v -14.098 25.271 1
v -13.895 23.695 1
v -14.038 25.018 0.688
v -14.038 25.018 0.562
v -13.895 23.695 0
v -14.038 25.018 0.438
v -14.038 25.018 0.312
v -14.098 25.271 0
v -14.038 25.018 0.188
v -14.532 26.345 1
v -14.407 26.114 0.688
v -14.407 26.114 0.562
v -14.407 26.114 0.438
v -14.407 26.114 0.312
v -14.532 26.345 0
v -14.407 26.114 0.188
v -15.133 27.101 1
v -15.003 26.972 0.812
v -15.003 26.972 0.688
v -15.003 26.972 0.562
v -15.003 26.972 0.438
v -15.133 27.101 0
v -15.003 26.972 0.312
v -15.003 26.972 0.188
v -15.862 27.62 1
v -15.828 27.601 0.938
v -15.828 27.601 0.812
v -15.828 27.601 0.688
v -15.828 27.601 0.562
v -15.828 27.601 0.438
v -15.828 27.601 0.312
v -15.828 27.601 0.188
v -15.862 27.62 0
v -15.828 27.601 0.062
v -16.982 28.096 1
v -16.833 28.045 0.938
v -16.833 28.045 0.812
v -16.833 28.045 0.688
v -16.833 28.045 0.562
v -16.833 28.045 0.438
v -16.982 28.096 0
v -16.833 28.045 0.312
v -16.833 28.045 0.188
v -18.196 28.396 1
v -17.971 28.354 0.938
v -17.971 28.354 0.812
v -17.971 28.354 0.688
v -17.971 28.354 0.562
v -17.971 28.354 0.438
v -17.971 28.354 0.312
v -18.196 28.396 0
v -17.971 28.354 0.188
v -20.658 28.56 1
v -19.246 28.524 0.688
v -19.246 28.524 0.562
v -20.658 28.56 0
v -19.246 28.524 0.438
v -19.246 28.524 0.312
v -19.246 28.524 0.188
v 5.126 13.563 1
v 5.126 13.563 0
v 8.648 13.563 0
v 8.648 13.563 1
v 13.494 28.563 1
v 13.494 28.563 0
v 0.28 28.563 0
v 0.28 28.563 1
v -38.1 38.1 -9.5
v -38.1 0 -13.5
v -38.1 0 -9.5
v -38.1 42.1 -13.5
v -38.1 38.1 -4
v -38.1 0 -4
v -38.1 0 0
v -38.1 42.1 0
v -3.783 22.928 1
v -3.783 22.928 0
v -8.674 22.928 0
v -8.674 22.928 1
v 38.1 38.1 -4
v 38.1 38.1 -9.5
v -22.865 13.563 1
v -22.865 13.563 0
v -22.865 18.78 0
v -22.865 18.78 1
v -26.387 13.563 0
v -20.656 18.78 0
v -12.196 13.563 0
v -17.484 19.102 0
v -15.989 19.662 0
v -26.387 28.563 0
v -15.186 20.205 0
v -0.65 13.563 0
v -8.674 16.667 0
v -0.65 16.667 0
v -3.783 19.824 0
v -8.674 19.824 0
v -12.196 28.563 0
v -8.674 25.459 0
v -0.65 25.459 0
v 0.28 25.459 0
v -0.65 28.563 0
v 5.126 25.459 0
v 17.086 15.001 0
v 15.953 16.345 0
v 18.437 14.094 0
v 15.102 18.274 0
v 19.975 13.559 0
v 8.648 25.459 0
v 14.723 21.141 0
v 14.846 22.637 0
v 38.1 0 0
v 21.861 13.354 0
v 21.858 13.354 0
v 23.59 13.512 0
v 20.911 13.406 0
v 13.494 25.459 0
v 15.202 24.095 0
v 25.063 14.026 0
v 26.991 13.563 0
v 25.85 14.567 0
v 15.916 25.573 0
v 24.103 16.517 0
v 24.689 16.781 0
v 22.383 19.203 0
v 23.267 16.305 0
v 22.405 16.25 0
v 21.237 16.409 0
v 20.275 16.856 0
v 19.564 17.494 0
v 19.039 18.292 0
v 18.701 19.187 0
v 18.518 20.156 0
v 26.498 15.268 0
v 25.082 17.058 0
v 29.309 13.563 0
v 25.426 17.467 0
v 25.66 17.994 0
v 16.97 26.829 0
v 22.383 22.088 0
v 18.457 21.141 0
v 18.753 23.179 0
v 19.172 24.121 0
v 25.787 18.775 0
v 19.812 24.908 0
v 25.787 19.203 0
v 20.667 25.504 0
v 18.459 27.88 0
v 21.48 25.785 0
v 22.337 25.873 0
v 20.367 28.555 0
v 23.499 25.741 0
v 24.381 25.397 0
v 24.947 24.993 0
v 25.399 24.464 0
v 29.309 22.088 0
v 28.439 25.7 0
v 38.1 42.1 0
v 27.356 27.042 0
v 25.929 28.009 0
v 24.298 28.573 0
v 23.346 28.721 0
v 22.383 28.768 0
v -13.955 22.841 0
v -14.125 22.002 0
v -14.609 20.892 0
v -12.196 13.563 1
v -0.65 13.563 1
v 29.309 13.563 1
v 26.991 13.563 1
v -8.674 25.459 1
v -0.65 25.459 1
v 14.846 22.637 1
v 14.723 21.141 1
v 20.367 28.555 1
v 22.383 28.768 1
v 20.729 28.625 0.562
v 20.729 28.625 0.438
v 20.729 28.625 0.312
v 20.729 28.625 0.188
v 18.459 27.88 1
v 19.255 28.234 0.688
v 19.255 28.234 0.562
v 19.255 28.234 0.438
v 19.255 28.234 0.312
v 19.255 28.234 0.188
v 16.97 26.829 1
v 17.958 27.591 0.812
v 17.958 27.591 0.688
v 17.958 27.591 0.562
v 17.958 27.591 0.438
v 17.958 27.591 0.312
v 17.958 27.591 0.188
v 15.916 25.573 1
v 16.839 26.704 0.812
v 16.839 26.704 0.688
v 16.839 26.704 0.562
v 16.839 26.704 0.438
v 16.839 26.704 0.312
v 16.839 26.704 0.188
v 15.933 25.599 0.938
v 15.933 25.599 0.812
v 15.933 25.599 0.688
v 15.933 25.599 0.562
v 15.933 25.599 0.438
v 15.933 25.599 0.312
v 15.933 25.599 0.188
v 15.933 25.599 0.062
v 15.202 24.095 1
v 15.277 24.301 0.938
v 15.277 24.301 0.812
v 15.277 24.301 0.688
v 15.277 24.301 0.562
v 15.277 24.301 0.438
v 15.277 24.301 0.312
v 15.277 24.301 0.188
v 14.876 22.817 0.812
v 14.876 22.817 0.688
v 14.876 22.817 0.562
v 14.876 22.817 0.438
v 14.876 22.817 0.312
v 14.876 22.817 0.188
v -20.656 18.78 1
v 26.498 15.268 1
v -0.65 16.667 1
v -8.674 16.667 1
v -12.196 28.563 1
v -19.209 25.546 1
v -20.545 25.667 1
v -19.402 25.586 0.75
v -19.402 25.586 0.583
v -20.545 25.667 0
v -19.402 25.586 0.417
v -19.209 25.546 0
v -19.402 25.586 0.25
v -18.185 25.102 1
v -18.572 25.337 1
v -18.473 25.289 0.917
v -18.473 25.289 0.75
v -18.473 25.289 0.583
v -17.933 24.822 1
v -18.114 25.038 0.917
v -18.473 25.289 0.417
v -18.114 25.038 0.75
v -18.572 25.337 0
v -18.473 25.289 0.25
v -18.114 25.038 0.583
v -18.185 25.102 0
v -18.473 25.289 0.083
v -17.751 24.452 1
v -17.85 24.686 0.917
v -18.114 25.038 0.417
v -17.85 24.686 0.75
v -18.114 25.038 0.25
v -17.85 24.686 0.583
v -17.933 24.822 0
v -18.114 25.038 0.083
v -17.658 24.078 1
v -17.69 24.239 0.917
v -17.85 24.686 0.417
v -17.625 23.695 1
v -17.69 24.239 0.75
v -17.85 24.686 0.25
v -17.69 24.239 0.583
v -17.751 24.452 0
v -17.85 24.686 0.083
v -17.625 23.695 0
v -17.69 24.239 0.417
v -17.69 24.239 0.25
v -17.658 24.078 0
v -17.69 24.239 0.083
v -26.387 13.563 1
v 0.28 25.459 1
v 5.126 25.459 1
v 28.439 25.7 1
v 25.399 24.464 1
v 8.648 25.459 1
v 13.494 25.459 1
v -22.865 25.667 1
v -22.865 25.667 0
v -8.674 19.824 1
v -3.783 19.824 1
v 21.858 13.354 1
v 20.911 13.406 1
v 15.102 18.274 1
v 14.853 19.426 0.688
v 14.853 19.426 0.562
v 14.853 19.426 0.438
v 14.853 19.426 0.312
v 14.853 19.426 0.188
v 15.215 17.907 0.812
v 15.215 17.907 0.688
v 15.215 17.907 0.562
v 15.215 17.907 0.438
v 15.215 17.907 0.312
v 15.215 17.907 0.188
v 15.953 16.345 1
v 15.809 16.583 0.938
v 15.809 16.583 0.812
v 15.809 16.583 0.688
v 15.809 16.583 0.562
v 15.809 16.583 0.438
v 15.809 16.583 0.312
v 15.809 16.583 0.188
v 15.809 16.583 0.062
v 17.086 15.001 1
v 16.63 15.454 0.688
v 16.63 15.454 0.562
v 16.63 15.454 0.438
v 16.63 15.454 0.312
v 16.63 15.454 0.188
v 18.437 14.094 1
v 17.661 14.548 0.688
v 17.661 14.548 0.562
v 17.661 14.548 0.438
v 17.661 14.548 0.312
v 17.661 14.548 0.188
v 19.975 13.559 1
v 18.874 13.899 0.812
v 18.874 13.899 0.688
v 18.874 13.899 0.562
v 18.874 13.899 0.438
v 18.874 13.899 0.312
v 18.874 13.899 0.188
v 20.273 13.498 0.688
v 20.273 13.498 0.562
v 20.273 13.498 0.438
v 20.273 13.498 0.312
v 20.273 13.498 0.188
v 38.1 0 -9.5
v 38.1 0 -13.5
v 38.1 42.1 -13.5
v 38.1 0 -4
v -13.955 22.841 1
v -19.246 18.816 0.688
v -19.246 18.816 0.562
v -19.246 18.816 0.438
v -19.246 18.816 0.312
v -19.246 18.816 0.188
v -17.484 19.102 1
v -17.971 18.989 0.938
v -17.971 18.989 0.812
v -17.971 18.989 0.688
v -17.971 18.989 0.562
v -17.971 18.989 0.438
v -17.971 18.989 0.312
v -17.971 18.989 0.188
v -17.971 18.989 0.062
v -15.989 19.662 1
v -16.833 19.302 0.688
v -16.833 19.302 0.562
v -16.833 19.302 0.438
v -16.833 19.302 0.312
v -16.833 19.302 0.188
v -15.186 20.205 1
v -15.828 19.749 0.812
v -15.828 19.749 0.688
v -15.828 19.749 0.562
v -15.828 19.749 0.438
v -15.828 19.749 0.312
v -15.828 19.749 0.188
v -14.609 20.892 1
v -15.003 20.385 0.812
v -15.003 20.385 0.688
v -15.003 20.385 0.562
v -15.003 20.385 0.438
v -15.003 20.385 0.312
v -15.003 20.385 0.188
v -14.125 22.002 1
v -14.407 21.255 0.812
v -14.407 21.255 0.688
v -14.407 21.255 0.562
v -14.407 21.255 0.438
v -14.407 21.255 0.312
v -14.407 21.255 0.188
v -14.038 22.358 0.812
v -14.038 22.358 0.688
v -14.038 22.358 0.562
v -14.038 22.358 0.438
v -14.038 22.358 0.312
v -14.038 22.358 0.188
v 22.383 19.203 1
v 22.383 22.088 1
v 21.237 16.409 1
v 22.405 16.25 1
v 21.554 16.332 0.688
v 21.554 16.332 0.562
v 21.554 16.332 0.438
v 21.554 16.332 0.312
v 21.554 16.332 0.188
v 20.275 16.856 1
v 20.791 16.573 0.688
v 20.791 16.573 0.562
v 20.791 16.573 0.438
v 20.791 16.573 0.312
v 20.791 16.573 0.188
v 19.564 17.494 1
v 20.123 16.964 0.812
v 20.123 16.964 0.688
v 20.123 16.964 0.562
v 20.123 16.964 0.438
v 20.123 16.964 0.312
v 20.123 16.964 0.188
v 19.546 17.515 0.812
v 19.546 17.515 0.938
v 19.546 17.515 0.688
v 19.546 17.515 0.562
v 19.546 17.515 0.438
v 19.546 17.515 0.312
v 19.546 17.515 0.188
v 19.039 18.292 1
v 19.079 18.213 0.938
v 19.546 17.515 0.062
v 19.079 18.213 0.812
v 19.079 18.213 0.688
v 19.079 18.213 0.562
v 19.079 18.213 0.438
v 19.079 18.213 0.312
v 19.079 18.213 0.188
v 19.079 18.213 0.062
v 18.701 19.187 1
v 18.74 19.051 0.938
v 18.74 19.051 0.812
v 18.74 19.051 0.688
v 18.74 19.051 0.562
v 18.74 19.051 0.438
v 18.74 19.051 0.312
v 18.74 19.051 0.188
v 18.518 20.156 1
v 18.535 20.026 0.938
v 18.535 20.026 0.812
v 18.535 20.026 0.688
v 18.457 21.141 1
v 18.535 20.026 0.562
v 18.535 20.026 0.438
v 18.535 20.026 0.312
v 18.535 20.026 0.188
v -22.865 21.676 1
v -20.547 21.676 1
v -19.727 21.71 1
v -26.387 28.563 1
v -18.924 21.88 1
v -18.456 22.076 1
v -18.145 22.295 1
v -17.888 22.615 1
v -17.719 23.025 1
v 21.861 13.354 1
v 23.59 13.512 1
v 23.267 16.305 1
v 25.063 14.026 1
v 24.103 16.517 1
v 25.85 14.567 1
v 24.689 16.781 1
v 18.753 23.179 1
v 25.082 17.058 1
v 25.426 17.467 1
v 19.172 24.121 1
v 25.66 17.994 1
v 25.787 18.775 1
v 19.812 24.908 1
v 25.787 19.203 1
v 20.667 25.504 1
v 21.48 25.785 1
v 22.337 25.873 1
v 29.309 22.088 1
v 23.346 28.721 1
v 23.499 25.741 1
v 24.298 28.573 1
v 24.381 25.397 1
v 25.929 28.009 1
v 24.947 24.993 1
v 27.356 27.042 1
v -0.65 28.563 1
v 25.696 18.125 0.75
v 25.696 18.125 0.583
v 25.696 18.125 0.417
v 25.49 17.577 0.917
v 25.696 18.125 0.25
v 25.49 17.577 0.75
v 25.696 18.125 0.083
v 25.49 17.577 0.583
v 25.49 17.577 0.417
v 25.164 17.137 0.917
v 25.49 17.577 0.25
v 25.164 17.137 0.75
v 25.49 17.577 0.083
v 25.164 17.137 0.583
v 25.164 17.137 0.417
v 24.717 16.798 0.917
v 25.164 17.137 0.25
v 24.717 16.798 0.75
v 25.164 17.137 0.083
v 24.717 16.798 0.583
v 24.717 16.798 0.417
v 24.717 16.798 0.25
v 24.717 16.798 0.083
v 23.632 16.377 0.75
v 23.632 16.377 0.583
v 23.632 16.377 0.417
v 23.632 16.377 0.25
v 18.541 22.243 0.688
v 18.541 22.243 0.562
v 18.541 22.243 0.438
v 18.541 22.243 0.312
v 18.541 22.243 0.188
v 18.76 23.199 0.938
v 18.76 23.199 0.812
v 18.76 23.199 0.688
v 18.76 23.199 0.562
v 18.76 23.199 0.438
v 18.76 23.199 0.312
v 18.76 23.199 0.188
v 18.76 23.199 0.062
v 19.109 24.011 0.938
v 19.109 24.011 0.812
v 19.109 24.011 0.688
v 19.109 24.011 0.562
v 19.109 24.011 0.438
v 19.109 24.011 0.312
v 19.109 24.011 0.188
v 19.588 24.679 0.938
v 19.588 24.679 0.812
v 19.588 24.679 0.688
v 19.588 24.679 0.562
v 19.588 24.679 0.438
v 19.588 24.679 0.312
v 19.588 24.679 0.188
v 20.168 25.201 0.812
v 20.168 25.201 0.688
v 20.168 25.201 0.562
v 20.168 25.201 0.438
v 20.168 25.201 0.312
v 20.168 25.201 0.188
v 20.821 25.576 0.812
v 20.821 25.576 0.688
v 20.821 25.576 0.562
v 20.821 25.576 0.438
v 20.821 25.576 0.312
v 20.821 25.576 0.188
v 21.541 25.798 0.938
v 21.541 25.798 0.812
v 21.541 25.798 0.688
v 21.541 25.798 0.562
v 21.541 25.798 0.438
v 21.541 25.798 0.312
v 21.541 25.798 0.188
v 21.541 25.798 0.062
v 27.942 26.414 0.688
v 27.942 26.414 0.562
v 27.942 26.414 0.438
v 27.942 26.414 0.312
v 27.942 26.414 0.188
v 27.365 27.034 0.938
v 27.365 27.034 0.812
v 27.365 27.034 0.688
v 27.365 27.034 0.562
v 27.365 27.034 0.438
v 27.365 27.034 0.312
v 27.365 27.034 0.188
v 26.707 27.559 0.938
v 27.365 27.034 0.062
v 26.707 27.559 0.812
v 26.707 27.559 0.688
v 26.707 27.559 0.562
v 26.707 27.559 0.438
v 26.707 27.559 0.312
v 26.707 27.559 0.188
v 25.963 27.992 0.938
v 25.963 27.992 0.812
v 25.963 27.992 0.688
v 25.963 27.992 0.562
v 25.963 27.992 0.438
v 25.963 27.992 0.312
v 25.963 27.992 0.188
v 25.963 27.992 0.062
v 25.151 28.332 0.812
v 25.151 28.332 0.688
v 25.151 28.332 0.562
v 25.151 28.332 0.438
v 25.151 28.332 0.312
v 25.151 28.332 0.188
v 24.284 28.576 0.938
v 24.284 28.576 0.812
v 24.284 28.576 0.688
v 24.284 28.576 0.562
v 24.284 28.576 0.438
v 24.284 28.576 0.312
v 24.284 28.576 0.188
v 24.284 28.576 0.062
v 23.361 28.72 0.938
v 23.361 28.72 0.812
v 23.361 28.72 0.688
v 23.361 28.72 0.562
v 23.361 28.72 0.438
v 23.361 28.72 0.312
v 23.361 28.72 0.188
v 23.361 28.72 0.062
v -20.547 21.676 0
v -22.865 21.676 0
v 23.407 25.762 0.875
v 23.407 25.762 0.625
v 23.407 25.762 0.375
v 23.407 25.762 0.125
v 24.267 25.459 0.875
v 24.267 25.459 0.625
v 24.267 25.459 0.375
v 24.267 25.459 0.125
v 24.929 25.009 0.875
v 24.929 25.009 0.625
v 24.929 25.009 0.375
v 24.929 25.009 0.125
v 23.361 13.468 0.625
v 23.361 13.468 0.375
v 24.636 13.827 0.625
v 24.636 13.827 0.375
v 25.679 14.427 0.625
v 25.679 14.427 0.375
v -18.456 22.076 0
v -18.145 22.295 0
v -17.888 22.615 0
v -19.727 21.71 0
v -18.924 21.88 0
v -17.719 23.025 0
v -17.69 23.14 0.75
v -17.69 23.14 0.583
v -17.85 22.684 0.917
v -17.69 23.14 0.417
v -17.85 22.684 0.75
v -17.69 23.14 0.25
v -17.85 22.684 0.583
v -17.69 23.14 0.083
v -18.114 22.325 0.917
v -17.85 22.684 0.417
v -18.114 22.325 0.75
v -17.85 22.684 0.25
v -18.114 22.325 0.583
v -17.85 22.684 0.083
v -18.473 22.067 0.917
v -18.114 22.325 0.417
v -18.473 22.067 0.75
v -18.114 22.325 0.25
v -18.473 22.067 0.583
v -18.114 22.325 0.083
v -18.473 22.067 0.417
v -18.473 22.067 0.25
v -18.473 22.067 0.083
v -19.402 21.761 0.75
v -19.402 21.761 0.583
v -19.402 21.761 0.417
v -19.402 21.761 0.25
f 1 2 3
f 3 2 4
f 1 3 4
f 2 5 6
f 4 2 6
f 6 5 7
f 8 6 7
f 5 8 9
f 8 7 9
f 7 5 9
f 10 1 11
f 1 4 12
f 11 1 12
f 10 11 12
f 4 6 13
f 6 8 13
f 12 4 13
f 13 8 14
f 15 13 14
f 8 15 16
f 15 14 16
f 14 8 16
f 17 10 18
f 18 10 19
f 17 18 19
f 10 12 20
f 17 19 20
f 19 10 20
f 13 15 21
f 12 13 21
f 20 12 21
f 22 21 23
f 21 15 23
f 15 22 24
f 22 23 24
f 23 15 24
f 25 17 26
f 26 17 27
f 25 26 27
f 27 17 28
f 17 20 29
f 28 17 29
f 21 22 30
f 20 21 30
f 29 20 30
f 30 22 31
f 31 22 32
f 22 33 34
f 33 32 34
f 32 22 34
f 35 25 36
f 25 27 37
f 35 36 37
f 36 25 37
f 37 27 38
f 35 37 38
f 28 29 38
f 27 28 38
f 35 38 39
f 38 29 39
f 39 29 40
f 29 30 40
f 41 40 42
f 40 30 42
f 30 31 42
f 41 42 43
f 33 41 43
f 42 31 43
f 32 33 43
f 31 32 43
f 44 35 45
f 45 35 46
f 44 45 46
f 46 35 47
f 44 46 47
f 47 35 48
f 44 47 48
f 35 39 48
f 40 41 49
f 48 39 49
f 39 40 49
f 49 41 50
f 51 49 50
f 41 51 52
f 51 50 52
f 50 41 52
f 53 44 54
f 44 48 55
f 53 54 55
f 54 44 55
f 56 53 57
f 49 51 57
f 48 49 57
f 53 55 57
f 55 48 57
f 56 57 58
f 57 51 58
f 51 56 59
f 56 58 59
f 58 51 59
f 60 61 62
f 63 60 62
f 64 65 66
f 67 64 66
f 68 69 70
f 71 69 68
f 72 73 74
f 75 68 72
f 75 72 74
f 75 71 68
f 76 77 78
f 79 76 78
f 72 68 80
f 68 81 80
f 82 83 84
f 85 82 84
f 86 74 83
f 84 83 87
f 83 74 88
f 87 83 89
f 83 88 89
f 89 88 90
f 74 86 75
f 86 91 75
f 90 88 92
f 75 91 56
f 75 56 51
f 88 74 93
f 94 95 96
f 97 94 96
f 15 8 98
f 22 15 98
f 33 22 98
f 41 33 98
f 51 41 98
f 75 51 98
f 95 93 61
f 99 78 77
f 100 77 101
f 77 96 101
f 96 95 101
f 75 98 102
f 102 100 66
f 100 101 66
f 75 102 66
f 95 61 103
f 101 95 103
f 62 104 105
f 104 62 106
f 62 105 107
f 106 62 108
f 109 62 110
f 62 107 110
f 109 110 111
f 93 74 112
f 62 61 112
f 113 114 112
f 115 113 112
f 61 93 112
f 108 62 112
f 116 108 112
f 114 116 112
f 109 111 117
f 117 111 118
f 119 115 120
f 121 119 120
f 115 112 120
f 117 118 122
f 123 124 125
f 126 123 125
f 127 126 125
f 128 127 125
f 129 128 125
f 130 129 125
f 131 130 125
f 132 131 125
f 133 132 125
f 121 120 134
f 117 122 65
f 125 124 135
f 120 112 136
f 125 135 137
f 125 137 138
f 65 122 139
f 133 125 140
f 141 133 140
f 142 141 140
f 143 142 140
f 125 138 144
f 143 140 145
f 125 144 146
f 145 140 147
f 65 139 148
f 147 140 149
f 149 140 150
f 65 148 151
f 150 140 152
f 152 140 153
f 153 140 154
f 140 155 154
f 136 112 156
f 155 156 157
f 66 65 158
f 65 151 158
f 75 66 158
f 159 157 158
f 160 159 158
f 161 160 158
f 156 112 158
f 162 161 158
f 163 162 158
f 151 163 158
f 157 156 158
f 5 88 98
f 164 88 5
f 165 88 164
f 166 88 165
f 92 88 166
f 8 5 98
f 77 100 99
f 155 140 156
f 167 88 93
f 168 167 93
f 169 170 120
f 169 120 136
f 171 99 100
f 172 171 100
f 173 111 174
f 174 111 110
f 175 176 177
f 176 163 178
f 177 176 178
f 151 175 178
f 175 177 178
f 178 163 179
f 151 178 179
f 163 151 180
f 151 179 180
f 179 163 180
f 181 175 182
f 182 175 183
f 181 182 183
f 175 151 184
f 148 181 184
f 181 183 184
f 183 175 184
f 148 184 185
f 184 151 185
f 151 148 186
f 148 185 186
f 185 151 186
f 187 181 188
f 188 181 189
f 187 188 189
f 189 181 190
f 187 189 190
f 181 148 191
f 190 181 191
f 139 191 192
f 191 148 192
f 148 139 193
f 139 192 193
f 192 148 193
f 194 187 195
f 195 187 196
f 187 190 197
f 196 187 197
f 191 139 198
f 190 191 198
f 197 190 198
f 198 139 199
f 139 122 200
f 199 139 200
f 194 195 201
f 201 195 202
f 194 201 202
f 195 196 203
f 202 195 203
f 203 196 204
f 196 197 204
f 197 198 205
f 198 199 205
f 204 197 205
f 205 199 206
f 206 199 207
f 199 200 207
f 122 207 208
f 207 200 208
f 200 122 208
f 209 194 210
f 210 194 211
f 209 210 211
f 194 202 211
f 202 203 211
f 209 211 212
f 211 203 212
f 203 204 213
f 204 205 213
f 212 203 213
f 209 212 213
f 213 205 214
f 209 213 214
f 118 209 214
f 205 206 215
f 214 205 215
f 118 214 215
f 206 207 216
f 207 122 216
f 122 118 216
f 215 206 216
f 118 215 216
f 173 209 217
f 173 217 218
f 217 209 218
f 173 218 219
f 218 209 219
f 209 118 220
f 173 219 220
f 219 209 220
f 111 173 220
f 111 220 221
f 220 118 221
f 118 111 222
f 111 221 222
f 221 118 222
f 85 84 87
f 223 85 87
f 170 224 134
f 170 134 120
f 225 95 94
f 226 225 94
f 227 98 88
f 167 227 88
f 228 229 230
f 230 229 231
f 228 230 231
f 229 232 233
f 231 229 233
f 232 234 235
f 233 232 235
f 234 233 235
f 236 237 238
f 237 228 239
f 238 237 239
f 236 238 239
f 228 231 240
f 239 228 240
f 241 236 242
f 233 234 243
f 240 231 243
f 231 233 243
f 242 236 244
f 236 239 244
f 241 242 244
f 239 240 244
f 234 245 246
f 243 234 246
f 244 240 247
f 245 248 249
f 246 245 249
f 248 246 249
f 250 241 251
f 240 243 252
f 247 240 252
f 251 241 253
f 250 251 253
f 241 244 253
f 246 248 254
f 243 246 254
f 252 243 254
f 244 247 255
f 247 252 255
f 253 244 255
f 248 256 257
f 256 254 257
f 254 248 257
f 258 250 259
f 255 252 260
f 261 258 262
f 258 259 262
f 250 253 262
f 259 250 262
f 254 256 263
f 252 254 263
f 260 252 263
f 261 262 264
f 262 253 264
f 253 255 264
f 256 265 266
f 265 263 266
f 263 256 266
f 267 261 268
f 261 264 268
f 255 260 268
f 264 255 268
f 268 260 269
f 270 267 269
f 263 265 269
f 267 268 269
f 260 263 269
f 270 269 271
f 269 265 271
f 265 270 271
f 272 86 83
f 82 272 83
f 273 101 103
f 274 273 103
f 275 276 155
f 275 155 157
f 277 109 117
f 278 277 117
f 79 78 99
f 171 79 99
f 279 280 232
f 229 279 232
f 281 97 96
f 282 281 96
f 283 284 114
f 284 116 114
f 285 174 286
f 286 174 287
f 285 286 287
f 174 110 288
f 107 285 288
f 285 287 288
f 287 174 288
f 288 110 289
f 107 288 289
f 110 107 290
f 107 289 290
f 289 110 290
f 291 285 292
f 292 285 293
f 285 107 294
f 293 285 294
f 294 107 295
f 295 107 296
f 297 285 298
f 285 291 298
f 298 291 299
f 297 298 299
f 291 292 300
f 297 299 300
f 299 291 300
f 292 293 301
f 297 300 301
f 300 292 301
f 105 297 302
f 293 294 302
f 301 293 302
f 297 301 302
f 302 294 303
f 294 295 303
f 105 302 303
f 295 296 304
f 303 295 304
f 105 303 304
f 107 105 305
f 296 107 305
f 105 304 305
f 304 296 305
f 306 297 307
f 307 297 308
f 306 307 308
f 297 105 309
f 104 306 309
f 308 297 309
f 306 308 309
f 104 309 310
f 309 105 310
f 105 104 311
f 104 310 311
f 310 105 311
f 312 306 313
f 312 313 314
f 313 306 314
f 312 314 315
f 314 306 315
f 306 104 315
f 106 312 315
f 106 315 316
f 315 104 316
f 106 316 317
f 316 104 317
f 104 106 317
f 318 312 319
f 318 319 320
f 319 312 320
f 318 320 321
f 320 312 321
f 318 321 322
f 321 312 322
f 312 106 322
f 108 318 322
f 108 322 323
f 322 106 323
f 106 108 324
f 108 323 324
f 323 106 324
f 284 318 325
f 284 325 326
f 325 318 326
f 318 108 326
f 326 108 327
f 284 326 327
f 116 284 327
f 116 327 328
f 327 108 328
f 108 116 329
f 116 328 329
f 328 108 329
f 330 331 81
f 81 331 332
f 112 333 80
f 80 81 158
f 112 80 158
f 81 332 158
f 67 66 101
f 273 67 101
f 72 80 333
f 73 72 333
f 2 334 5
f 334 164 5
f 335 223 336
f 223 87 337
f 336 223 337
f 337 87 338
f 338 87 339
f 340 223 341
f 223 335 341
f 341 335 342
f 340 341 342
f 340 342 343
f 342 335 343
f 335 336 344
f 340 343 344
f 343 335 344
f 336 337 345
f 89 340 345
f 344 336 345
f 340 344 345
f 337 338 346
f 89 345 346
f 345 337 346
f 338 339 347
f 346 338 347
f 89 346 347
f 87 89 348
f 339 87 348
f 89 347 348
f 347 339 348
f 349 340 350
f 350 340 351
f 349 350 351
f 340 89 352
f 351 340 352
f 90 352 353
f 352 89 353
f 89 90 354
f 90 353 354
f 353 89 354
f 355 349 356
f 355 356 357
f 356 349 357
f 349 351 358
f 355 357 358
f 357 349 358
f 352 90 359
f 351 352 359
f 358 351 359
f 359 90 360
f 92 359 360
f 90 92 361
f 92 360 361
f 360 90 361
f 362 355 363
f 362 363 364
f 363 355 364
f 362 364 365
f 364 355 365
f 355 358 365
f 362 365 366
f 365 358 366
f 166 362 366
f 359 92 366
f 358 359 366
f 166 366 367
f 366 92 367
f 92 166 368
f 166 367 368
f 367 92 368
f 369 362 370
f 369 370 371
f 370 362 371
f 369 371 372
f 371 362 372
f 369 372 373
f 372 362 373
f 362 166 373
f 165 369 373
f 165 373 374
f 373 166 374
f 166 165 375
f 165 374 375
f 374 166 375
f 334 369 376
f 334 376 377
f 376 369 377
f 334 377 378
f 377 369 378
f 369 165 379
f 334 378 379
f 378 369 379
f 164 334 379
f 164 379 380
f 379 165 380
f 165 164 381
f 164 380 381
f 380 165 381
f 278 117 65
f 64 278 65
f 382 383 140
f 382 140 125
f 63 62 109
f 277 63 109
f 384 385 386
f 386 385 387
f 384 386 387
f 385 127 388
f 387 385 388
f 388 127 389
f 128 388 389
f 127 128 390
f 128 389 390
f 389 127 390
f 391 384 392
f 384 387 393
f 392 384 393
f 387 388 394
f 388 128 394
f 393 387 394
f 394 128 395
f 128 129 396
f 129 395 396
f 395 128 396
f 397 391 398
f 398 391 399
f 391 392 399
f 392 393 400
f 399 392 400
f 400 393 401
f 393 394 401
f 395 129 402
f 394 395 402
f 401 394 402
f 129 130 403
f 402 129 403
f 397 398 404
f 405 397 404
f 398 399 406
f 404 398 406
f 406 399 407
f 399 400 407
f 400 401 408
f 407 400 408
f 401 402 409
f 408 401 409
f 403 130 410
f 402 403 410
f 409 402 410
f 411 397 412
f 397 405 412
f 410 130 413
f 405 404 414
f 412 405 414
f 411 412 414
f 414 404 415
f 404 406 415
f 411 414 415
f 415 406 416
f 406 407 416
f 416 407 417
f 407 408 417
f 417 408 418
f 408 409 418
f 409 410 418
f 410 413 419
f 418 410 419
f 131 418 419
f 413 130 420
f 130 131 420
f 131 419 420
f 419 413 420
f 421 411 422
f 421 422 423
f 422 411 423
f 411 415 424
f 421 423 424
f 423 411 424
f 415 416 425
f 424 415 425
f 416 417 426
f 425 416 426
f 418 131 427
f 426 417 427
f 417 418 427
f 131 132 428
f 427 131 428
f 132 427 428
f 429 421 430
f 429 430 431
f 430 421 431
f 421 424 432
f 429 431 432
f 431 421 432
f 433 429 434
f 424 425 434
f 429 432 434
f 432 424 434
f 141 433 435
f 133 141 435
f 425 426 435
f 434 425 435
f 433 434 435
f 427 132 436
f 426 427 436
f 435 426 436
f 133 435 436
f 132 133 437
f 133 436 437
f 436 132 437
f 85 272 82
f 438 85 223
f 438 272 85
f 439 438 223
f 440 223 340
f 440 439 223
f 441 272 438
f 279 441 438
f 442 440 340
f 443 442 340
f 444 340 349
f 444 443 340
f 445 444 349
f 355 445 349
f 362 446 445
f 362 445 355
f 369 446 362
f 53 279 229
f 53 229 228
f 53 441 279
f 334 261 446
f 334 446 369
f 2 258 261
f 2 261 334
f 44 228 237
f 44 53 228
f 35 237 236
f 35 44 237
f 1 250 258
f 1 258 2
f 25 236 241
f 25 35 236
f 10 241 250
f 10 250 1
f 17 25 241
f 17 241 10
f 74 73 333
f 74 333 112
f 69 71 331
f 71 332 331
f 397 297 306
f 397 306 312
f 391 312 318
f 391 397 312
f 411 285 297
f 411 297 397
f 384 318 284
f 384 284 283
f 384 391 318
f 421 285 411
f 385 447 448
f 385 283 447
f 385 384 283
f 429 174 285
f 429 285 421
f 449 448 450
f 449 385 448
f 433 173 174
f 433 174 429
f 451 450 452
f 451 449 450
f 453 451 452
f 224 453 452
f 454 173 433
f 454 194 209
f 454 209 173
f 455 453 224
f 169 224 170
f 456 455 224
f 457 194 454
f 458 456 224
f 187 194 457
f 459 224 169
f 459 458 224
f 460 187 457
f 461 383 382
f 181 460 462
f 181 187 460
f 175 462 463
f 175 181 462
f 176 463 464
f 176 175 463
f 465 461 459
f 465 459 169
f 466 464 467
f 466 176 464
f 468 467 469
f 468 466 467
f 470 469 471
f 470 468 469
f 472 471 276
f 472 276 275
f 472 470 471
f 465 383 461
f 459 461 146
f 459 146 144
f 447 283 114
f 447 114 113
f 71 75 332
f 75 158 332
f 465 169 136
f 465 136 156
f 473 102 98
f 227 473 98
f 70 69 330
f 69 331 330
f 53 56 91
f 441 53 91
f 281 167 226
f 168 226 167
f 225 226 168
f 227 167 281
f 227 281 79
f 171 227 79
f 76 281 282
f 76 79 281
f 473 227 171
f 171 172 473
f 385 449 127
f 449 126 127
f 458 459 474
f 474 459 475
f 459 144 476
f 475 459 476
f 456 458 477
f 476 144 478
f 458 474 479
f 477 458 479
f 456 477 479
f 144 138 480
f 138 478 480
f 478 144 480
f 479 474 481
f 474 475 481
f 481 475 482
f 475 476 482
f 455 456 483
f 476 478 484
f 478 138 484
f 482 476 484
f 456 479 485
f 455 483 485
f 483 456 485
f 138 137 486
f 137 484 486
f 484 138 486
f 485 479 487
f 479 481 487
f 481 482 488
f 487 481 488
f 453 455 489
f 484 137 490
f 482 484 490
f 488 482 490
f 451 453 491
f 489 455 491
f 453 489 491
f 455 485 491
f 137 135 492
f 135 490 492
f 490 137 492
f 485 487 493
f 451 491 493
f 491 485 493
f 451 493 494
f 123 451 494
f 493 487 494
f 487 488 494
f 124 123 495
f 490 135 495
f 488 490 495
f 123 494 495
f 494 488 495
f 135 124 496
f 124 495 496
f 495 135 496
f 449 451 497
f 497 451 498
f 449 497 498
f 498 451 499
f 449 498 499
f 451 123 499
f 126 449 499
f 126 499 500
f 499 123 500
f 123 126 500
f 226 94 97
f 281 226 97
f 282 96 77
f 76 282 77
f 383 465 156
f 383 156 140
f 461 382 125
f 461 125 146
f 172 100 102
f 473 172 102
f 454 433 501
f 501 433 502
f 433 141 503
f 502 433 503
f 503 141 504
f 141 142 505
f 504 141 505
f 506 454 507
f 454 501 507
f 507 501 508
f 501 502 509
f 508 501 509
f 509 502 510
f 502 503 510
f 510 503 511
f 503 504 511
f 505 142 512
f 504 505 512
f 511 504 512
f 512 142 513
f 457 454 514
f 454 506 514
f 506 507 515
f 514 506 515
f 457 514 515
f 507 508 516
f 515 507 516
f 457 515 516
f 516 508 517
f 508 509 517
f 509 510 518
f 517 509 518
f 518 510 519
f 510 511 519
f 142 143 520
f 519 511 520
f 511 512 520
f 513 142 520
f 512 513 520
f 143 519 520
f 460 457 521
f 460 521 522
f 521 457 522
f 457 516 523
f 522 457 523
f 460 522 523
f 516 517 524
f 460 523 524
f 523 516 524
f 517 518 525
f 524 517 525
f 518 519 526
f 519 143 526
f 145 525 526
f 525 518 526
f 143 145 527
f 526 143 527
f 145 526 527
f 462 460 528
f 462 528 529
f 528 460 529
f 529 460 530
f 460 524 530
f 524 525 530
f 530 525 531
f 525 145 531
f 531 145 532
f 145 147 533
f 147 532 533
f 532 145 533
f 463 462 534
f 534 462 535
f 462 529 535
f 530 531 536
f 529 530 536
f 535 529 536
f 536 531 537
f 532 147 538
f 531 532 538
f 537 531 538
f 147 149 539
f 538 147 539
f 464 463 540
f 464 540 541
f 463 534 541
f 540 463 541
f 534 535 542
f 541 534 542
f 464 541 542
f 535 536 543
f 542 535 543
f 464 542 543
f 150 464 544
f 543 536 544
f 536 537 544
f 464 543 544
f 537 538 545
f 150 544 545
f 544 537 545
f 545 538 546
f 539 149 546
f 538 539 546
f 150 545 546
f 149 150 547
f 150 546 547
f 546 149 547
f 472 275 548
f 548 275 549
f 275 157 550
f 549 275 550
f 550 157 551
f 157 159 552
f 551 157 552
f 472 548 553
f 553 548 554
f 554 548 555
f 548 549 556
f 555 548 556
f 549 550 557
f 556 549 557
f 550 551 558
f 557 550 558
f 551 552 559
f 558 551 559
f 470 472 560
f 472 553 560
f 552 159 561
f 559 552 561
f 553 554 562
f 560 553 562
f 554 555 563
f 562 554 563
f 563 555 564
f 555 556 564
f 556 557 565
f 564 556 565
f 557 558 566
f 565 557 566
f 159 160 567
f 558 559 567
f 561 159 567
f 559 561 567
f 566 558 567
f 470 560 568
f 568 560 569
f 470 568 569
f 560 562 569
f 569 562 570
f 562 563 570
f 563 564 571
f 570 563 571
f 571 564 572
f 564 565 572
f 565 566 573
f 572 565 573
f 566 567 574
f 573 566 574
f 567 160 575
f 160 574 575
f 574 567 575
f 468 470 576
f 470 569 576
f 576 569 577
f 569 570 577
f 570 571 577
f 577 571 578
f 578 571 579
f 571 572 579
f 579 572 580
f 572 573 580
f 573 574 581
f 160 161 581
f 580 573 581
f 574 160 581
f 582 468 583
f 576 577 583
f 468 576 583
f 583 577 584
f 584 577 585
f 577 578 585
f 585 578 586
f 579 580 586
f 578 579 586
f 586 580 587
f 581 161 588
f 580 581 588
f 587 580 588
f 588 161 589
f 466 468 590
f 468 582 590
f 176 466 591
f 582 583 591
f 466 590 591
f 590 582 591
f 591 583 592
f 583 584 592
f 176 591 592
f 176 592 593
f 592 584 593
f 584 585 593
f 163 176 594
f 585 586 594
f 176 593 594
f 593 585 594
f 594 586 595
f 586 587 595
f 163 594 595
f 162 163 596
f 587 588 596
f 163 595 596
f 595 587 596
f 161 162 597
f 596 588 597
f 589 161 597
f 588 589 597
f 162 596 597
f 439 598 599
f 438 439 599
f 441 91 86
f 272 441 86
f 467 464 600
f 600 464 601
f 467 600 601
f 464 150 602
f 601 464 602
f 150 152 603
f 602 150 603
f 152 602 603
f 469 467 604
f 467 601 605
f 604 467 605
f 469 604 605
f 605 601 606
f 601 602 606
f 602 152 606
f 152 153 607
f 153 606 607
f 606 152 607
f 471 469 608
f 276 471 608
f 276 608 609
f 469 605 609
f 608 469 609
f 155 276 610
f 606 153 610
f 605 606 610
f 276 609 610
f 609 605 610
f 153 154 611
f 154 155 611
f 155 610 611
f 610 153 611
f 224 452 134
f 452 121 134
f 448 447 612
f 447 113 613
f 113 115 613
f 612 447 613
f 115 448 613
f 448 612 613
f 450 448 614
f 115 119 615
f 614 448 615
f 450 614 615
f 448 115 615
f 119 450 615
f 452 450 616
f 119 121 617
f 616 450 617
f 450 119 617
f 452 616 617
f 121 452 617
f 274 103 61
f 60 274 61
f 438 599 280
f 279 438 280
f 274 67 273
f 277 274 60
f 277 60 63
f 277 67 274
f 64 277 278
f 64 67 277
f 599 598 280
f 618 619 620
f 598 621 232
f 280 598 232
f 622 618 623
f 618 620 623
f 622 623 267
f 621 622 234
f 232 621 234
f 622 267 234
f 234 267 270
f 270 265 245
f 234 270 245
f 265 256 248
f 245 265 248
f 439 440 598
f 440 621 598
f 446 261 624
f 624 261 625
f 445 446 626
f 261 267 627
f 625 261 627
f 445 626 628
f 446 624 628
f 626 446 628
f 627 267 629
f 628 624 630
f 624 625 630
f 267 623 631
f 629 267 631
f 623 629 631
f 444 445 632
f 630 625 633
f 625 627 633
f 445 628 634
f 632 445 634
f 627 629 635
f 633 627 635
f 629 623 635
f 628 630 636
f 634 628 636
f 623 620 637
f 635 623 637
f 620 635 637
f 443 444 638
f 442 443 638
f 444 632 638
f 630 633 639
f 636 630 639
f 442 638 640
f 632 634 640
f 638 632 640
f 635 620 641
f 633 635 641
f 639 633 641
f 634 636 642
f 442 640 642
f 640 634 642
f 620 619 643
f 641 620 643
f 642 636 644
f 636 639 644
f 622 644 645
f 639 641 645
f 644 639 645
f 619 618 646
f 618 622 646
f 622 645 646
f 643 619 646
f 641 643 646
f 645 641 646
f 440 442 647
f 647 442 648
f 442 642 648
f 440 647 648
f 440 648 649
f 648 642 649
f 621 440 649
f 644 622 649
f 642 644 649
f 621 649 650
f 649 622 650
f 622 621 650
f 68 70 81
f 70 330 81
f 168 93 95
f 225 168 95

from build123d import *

# Parameters (mm, degrees)
BOSS_EXTRUDE1_DEPTH = 38.1
BOSS_EXTRUDE3_DEPTH = 1


with BuildPart() as part:
    # Sketch1 → Boss-Extrude1 (new, symmetric)
    with BuildSketch(Plane(origin=(0, 0, 0), x_dir=(0, 0, -1), z_dir=(1, 0, 0))):
        Polygon((0, 0), (0, 42.1), (13.5, 42.1), (13.5, 0), (9.5, 0), (9.5, 38.1), (4, 38.1), (4, 0), align=None)
    extrude(amount=BOSS_EXTRUDE1_DEPTH, both=True)

    # Sketch2 → Boss-Extrude3 (add, symmetric)
    # profile 1 of 4: a face of its own
    with BuildSketch(Plane.XY):
        with BuildLine():
            Line((-22.865222246, 13.563040297), (-22.865222246, 18.780432709))
            Line((-22.865222246, 18.780432709), (-20.656196004, 18.780432709))
            add(Edge.make_bspline(
                [(-20.656196004, 18.780432709), (-20.41532138, 18.777714688), (-19.944746821, 18.772404742), (-19.256261279, 18.810224697), (-18.600645479, 18.877020485), (-17.978390446, 18.980226184), (-17.390247833, 19.12055906), (-16.836558282, 19.293424233), (-16.315862603, 19.49892128), (-15.828517725, 19.737297205), (-15.380553204, 20.022617586), (-14.993581031, 20.375797987), (-14.662017368, 20.786709496), (-14.391374272, 21.257071797), (-14.179098793, 21.785516775), (-14.024744286, 22.370402283), (-13.921962582, 23.01285099), (-13.903931965, 23.461547081), (-13.894568167, 23.694567371)],
                knots=[0, 0, 0, 0, 1.204916498, 2.353934341, 3.447552957, 4.50072552, 5.507144687, 6.470335232, 7.400410051, 8.305130608, 9.181490644, 10.047735884, 10.914032333, 11.813195112, 12.752367202, 13.754944245, 14.834080452, 16, 16, 16, 16], degree=3))
            add(Edge.make_bspline(
                [(-13.894568167, 23.694567371), (-13.903912104, 23.925417991), (-13.921898868, 24.369797661), (-14.025029441, 25.006807545), (-14.179399587, 25.587187383), (-14.389513591, 26.111548771), (-14.664177487, 26.574134139), (-14.993451519, 26.981011122), (-15.380818743, 27.330678309), (-15.828590089, 27.612940523), (-16.316667278, 27.84726287), (-16.836506867, 28.053338122), (-17.389829867, 28.226848133), (-17.978554423, 28.363192211), (-18.600944194, 28.462338902), (-19.256226176, 28.530250328), (-19.945228379, 28.567767567), (-20.416269188, 28.562489884), (-20.657613081, 28.559785795)],
                knots=[0, 0, 0, 0, 1.159335541, 2.231681874, 3.232698059, 4.170289135, 5.058653394, 5.923911943, 6.789704034, 7.666336687, 8.571988794, 9.505503644, 10.472256703, 11.481143997, 12.537323696, 13.634987235, 14.788254905, 16, 16, 16, 16], degree=3))
            Line((-20.657613081, 28.559785795), (-26.386965308, 28.563043481))
            Line((-26.386965308, 28.563043481), (-26.386965308, 13.563040297))
            Line((-26.386965308, 13.563040297), (-22.865222246, 13.563040297))
        make_face()
        with BuildLine():
            Line((-22.865222246, 25.667387508), (-20.544629022, 25.667387508))
            add(Edge.make_bspline(
                [(-20.544629022, 25.667387508), (-20.345180429, 25.665639397), (-19.962840192, 25.662288292), (-19.413885258, 25.59887468), (-18.918181922, 25.479214253), (-18.542791264, 25.333863497), (-18.279322093, 25.181576921), (-18.109546209, 25.041861769), (-17.964935401, 24.876369042), (-17.843038449, 24.687071269), (-17.752852301, 24.470987064), (-17.684339378, 24.233628804), (-17.637945851, 23.972355884), (-17.629418881, 23.789333614), (-17.625003742, 23.694567371)],
                knots=[0, 0, 0, 0, 1.781037572, 3.414224772, 4.923837313, 6.326680743, 6.992801752, 7.634335185, 8.281065082, 8.949094245, 9.636325156, 10.36458847, 11.153207937, 12, 12, 12, 12], degree=3))
            add(Edge.make_bspline(
                [(-17.625003742, 23.694567371), (-17.629329654, 23.597614693), (-17.637641958, 23.411318694), (-17.684922478, 23.144843592), (-17.752207557, 22.902812702), (-17.843064613, 22.682637579), (-17.964858791, 22.490072062), (-18.109429188, 22.321339009), (-18.279109983, 22.1782603), (-18.542470117, 22.021767063), (-18.917168662, 21.869595463), (-19.414049866, 21.749447311), (-19.962950296, 21.674835955), (-20.346487469, 21.675658964), (-20.546743492, 21.676088682)],
                knots=[0, 0, 0, 0, 0.858904102, 1.650396881, 2.391060107, 3.081381858, 3.751946835, 4.400513148, 5.042831016, 5.70833034, 7.106722173, 8.605996457, 10.227891054, 12, 12, 12, 12], degree=3))
            Line((-20.546743492, 21.676088682), (-22.865222246, 21.676088682))
            Line((-22.865222246, 21.676088682), (-22.865222246, 25.667387508))
        make_face(mode=Mode.SUBTRACT)
    # profile 2 of 4: a face of its own
    with BuildSketch(Plane.XY):
        Polygon((-12.195657947, 13.563043481), (-0.649855777, 13.563043481), (-0.649855777, 16.667391966), (-8.673914885, 16.667391966), (-8.673914885, 19.823911191), (-3.782845148, 19.823911191), (-3.782845148, 22.928262861), (-8.673914885, 22.928262861), (-8.673914885, 25.458691811), (-0.649855777, 25.458691811), (-0.649855777, 28.563043481), (-12.195657947, 28.563043481), align=None)
    # profile 3 of 4: a face of its own
    with BuildSketch(Plane.XY):
        Polygon((5.12608486, 25.458691811), (5.12608486, 13.563040297), (8.647827923, 13.563040297), (8.647827923, 25.458691811), (13.493818677, 25.458691811), (13.493818677, 28.563043481), (0.280094107, 28.563043481), (0.280094107, 25.458691811), align=None)
    # profile 4 of 4: a face of its own
    with BuildSketch(Plane.XY):
        with BuildLine():
            add(Edge.make_bspline(
                [(21.8608551, 13.354347785), (22.119813105, 13.358336117), (22.621956763, 13.366069866), (23.347309068, 13.45445267), (24.017283661, 13.603578733), (24.630497021, 13.811632782), (25.189445256, 14.078118279), (25.684655597, 14.415907315), (26.129733363, 14.807635649), (26.374895594, 15.114568002), (26.497831712, 15.268478626)],
                knots=[0, 0, 0, 0, 1.191138677, 2.309728683, 3.355722582, 4.344328933, 5.283888983, 6.195335572, 7.095054579, 8, 8, 8, 8], degree=3))
            Line((26.497831712, 15.268478626), (26.990503352, 13.563040297))
            Line((26.990503352, 13.563040297), (29.30869869, 13.563040297))
            Line((29.30869869, 13.563040297), (29.30869869, 22.088177976))
            Line((29.30869869, 22.088177976), (22.382852281, 22.088177976))
            Line((22.382852281, 22.088177976), (22.382852281, 19.203123016))
            Line((22.382852281, 19.203123016), (25.786955627, 19.203123016))
            Line((25.786955627, 19.203123016), (25.786955627, 18.774812166))
            add(Edge.make_bspline(
                [(25.786955627, 18.774812166), (25.778243203, 18.661219148), (25.761488992, 18.442776904), (25.702246402, 18.128562143), (25.614895527, 17.840434035), (25.497809633, 17.575930668), (25.346821564, 17.340790726), (25.16732423, 17.130707606), (24.957475692, 16.947308094), (24.63654282, 16.740507442), (24.194902065, 16.536753638), (23.629652259, 16.364249197), (23.028988663, 16.258629639), (22.6167514, 16.25292484), (22.405439539, 16.250000573)],
                knots=[0, 0, 0, 0, 0.861669082, 1.657011429, 2.414175731, 3.135788245, 3.838590194, 4.52112295, 5.220643916, 5.939296776, 7.403767205, 8.884228686, 10.402862886, 12, 12, 12, 12], degree=3))
            add(Edge.make_bspline(
                [(22.405439539, 16.250000573), (22.25960337, 16.255002366), (21.974358066, 16.26478552), (21.556473033, 16.323383598), (21.161578461, 16.4238954), (20.790499519, 16.565804834), (20.441850175, 16.742306557), (20.115717207, 16.958951958), (19.816347235, 17.219006913), (19.537082003, 17.513572772), (19.286190745, 17.845177479), (19.070603452, 18.215328788), (18.883726471, 18.617755475), (18.732087018, 19.05621736), (18.609948745, 19.528105564), (18.528810433, 20.035948609), (18.471242635, 20.57699171), (18.461518922, 20.949842028), (18.456525657, 21.141305959)],
                knots=[0, 0, 0, 0, 0.986869521, 1.930247473, 2.848904307, 3.738120068, 4.613047601, 5.488129678, 6.379987628, 7.290452962, 8.230384354, 9.186491415, 10.18353076, 11.227919754, 12.321393683, 13.477294155, 14.704554734, 16, 16, 16, 16], degree=3))
            add(Edge.make_bspline(
                [(18.456525657, 21.141305959), (18.462691715, 21.33059976), (18.47469819, 21.699190413), (18.534060968, 22.233041601), (18.62284679, 22.732163005), (18.751930806, 23.192563277), (18.905705346, 23.620561964), (19.100451259, 24.00895419), (19.321125945, 24.36633998), (19.58108987, 24.680617067), (19.860542252, 24.962795133), (20.162806955, 25.204508316), (20.481013939, 25.412390421), (20.817605993, 25.582469386), (21.172019795, 25.713956508), (21.544172891, 25.804526785), (21.934117354, 25.861522595), (22.200891059, 25.869009794), (22.336961264, 25.872828703)],
                knots=[0, 0, 0, 0, 1.319686362, 2.569677693, 3.740666748, 4.849050422, 5.89897666, 6.905298387, 7.872232364, 8.820039799, 9.741499591, 10.636028391, 11.512339942, 12.386520023, 13.259089862, 14.141114384, 15.051859528, 16, 16, 16, 16], degree=3))
            add(Edge.make_bspline(
                [(22.336961264, 25.872828703), (22.524294222, 25.867412582), (22.883466683, 25.857028283), (23.394731341, 25.772727742), (23.856558075, 25.649553589), (24.263315352, 25.470493213), (24.620629848, 25.258577476), (24.928723783, 25.018120229), (25.195978892, 24.759746675), (25.332326749, 24.561134201), (25.398918436, 24.464132752)],
                knots=[0, 0, 0, 0, 1.278335478, 2.450945646, 3.529594048, 4.533408079, 5.47533349, 6.35867971, 7.198386473, 8, 8, 8, 8], degree=3))
            Line((25.398918436, 24.464132752), (28.439218206, 25.700050346))
            add(Edge.make_bspline(
                [(28.439218206, 25.700050346), (28.361079034, 25.823929698), (28.206257037, 26.069379557), (27.948215698, 26.41541292), (27.668439938, 26.7372298), (27.369948167, 27.03715345), (27.048315584, 27.311527509), (26.708040547, 27.564420909), (26.345403709, 27.791997061), (25.963035389, 27.997909002), (25.564035608, 28.179099544), (25.150089409, 28.336749678), (24.722958781, 28.469607783), (24.281431216, 28.581812576), (23.825986668, 28.665722756), (23.3566313, 28.723737703), (22.874502715, 28.760511724), (22.547897044, 28.765803507), (22.382613447, 28.768481492)],
                knots=[0, 0, 0, 0, 0.987447504, 1.956491095, 2.907400243, 3.861102247, 4.807224743, 5.755757746, 6.717677965, 7.691726565, 8.682375344, 9.670716339, 10.676890986, 11.697355627, 12.741116498, 13.797592121, 14.885439147, 16, 16, 16, 16], degree=3))
            add(Edge.make_bspline(
                [(22.382613447, 28.768481492), (22.099730981, 28.758621488), (21.546339814, 28.739332773), (20.738378686, 28.639019262), (19.976200826, 28.471654692), (19.256240644, 28.248028091), (18.582018051, 27.956846547), (17.953235542, 27.602814057), (17.366836258, 27.189513377), (16.831285034, 26.712718675), (16.342994106, 26.186120845), (15.920267276, 25.60388094), (15.560854464, 24.974654528), (15.262488717, 24.299715759), (15.031227955, 23.576774675), (14.863080191, 22.807064787), (14.753855008, 21.989948886), (14.733332745, 21.428607179), (14.722829213, 21.141305959)],
                knots=[0, 0, 0, 0, 1.115331854, 2.181877176, 3.203772788, 4.187522244, 5.148954065, 6.092764476, 7.027114261, 7.971051081, 8.914054022, 9.852422535, 10.800463299, 11.765325617, 12.755760334, 13.786945325, 14.86733286, 16, 16, 16, 16], degree=3))
            add(Edge.make_bspline(
                [(14.722829213, 21.141305959), (14.730391549, 20.847575412), (14.745163979, 20.273795857), (14.84038858, 19.438408616), (14.994067089, 18.651412225), (15.200032703, 17.912316957), (15.469382319, 17.22226235), (15.794902903, 16.581399506), (16.179745575, 15.988990666), (16.61978942, 15.447409763), (17.111798353, 14.960441635), (17.653299929, 14.536564006), (18.241912503, 14.179583732), (18.876009186, 13.884113096), (19.55662642, 13.654005492), (20.282457402, 13.483895793), (21.054564416, 13.378322793), (21.585535664, 13.362470658), (21.857613336, 13.354347785)],
                knots=[0, 0, 0, 0, 1.181046208, 2.307081006, 3.375954413, 4.402557026, 5.387877309, 6.349572523, 7.287872367, 8.223031757, 9.150200772, 10.065592574, 10.981568491, 11.912305234, 12.87289741, 13.865182061, 14.906087104, 16, 16, 16, 16], degree=3))
            Line((21.857613336, 13.354347785), (21.8608551, 13.354347785))
        make_face()
    extrude(amount=BOSS_EXTRUDE3_DEPTH, both=True)


solid = part.part
